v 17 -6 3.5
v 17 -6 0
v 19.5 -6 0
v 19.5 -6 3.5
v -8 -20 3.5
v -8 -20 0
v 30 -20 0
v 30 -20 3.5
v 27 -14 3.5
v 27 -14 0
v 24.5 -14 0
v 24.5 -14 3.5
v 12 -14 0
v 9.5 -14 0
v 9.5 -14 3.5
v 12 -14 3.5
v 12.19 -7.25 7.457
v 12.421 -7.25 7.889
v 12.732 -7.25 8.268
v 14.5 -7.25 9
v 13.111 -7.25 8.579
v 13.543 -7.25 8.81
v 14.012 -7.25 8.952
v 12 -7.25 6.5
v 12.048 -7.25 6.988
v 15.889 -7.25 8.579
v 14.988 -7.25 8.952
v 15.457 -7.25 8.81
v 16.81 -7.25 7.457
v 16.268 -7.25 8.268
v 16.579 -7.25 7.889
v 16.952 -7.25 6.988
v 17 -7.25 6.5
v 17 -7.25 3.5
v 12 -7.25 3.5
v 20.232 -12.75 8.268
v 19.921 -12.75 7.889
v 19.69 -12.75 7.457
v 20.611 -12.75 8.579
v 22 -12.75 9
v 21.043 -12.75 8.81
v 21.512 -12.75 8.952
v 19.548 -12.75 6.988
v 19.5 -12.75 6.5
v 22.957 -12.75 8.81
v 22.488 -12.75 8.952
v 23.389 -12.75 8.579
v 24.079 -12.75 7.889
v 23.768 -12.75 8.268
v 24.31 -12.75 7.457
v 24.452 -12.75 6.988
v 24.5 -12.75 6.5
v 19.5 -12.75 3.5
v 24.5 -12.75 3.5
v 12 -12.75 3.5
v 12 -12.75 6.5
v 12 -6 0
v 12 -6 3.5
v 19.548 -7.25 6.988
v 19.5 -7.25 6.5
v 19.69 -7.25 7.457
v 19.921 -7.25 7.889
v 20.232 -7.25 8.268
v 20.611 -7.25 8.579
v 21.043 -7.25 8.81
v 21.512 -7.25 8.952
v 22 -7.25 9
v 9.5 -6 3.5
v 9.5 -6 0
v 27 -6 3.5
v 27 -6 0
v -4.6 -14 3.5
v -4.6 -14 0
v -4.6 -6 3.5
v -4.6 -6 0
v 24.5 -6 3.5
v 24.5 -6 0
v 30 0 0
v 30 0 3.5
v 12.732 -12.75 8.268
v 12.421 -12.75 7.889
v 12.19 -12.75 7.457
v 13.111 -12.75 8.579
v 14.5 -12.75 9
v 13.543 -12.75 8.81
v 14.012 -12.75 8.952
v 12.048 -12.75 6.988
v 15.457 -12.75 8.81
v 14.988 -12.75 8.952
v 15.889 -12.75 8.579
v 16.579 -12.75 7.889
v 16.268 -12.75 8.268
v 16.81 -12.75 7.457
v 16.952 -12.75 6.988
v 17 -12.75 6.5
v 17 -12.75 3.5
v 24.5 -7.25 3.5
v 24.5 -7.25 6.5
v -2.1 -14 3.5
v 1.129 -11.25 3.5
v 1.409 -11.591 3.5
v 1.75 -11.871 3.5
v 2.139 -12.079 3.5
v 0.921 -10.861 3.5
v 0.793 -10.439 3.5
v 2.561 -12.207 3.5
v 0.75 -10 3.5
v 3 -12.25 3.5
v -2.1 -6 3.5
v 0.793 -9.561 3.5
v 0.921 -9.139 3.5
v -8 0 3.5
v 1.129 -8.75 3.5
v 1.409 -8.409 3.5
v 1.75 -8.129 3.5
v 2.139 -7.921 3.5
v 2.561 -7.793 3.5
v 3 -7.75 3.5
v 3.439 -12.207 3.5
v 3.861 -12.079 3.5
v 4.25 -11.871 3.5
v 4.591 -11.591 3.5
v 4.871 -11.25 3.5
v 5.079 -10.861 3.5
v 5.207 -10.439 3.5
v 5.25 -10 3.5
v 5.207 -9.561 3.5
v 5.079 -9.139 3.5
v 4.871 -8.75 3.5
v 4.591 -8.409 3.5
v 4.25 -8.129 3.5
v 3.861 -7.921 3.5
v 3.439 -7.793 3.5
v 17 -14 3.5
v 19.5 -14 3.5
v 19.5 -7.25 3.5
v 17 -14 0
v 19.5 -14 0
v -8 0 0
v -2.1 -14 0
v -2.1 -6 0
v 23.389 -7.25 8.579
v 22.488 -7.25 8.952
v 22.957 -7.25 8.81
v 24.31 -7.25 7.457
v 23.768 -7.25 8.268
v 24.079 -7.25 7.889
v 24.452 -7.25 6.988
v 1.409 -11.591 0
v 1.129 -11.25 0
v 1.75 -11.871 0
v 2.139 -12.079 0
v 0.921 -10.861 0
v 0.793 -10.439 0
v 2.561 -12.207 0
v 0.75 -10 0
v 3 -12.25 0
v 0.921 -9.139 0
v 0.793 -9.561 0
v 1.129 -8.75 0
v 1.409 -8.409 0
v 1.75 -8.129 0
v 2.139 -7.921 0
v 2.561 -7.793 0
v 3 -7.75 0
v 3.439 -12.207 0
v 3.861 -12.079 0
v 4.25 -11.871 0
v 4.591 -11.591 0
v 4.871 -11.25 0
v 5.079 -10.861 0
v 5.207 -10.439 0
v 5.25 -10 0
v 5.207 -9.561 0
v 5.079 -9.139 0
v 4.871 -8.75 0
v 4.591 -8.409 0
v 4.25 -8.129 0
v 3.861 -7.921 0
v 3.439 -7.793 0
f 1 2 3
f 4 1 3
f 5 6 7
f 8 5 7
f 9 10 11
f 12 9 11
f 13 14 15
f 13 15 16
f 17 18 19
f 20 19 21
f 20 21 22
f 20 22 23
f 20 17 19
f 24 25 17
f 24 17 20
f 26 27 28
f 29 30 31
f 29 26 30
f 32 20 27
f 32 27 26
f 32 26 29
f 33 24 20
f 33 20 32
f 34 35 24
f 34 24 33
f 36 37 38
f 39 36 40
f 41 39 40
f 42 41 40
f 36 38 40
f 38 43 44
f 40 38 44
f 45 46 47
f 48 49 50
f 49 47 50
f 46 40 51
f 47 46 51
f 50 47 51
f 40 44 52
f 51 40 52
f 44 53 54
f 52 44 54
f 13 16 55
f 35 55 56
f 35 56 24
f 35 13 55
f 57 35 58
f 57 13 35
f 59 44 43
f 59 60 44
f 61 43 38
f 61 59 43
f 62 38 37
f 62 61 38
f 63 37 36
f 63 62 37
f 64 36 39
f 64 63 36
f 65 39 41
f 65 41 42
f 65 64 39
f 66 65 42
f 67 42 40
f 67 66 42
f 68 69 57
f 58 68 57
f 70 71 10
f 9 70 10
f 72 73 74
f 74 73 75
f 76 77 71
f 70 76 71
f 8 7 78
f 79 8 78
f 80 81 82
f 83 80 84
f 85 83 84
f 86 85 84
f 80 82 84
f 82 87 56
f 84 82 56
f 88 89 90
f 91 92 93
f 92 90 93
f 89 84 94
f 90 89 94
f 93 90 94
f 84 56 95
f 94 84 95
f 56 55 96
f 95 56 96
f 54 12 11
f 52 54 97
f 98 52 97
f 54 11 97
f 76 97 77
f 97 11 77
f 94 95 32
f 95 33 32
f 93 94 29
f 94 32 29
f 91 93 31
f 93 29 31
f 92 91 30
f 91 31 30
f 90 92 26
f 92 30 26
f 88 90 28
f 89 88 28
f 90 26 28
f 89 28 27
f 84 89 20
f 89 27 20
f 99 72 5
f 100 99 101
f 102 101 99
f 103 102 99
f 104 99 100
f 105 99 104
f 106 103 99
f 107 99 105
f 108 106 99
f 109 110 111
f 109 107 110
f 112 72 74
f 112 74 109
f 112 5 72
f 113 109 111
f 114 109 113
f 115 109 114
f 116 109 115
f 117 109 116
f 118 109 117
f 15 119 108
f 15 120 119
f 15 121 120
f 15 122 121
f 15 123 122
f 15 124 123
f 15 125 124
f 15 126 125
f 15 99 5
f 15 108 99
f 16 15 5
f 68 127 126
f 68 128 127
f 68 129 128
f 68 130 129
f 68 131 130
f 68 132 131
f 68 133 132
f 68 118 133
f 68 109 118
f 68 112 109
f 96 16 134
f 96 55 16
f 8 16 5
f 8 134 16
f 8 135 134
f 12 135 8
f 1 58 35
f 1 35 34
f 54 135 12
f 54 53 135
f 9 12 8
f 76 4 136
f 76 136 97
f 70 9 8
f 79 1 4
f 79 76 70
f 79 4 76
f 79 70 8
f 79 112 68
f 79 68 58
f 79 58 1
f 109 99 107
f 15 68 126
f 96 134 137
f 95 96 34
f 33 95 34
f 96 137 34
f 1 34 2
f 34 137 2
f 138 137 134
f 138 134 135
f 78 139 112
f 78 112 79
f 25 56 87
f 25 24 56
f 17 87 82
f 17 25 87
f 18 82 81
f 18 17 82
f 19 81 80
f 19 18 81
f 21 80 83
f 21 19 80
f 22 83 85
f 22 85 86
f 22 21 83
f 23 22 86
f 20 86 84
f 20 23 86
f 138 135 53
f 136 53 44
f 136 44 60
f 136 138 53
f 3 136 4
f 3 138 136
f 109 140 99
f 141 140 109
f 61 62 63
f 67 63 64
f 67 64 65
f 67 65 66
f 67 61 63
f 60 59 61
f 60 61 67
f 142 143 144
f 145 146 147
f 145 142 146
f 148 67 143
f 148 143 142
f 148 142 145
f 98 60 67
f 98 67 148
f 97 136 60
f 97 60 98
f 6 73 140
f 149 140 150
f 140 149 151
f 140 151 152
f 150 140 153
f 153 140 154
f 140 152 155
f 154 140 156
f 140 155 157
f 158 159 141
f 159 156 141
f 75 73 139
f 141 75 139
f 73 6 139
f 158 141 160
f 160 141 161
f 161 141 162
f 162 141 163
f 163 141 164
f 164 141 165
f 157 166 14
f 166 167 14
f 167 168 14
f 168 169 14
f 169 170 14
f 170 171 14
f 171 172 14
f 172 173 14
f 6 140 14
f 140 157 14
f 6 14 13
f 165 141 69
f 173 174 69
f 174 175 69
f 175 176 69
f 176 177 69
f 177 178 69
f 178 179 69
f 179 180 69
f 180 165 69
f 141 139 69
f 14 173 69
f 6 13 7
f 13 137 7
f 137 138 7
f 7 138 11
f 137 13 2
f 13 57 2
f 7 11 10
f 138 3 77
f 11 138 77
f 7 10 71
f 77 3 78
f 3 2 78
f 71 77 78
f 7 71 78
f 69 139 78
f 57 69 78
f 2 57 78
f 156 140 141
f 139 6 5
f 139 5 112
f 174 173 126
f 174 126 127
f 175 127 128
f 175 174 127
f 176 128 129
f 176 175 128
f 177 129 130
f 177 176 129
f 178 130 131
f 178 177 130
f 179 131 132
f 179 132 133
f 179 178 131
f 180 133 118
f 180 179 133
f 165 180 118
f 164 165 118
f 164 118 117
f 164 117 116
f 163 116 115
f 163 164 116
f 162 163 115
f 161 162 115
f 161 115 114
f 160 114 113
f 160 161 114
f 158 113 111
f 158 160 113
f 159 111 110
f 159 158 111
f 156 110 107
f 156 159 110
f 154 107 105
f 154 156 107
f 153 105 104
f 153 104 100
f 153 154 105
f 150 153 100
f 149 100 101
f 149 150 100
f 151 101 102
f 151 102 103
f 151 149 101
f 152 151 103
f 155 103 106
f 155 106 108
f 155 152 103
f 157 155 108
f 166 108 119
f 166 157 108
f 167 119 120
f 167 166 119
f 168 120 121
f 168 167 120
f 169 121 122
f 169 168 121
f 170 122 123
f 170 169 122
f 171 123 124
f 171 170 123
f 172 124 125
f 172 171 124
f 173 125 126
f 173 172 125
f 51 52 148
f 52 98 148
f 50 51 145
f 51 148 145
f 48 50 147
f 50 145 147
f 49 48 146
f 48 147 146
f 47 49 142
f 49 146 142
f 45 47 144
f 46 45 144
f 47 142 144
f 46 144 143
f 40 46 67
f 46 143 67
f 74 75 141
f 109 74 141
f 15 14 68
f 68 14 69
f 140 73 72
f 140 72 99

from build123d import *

# Parameters (mm, degrees)
F0_W     = 38
F0_H     = 20
F0_W_2   = 2.5
F0_H_2   = 8
F0_R     = 2.25
F1_DEPTH = 3.5
F2_W     = 5
F2_H     = 5.5
F3_DEPTH = 5.5
F4_R     = 2.49999


# Not quite as in the source:
# - a fillet or chamfer is up to 0.001 mm smaller than in the source, because OpenCascade refuses the exact size


with BuildPart() as f1:
    # F0 (on Top) → F1 (new body)
    with BuildSketch(Plane.XY):
        with Locations((11, -10)):
            Rectangle(F0_W, F0_H)
        with Locations((-3.3499999251, -10)):
            Rectangle(F0_W_2, F0_H_2, mode=Mode.SUBTRACT)
        with Locations((3, -10)):
            Circle(F0_R, mode=Mode.SUBTRACT)
        with Locations((10.75, -10)):
            Rectangle(F0_W_2, F0_H_2, mode=Mode.SUBTRACT)
        with Locations((18.25, -10)):
            Rectangle(F0_W_2, F0_H_2, mode=Mode.SUBTRACT)
        Polygon((24.5, -10), (24.5, -6), (27, -6), (27, -14), (24.5, -14), align=None, mode=Mode.SUBTRACT)
    extrude(amount=F1_DEPTH)

    # F2 (on face) → F3 (join)
    with BuildSketch(Plane.XY.offset(3.5)):
        with Locations((22, -10)):
            Rectangle(F2_W, F2_H)
        with Locations((14.5, -10)):
            Rectangle(F2_W, F2_H)
    extrude(amount=F3_DEPTH)

    # F4 (radius 2.5 in the source; OpenCascade refuses exactly that, so slightly less here)
    f4_edges = [f1.edges().sort_by_distance(p)[0] for p in [
        (12, -10, 9),
        (17, -10, 9),
        (19.5, -10, 9),
        (24.5, -10, 9),
    ]]
    fillet(f4_edges, radius=F4_R)


solid = f1.part
